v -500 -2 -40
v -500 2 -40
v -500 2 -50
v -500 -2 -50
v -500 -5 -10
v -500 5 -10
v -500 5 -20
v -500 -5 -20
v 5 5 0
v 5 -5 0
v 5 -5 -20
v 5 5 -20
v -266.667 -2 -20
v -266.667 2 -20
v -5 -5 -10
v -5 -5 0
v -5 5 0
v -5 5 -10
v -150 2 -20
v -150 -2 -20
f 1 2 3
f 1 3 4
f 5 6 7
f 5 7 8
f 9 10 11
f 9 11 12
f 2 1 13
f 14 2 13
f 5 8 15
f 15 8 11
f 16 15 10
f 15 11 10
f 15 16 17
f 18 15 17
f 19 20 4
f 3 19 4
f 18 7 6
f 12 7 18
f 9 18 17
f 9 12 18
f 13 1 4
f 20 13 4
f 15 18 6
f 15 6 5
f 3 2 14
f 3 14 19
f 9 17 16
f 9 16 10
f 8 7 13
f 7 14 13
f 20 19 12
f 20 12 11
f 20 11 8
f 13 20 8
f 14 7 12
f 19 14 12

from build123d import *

# Parameters (mm, degrees)
F0_W     = 10
F0_H     = 10
F1_DEPTH = 20
F2_W     = 10
F2_H     = 10
F3_DEPTH = 495
F4_W     = 350
F4_H     = 4
F5_DEPTH = 30
F7_DEPTH = 7.001
F9_DEPTH = 7.001


with BuildPart() as f1:
    # F0 (on Top) → F1 (new body)
    with BuildSketch(Plane.XY):
        Rectangle(F0_W, F0_H)
    extrude(amount=-F1_DEPTH)

    # F2 (on face) → F3 (join)
    with BuildSketch(Plane(origin=(-5, 0, 0), x_dir=(0, -1, 0), z_dir=(-1, 0, 0))):
        with Locations((0, -15)):
            Rectangle(F2_W, F2_H)
    extrude(amount=F3_DEPTH)

    # F4 (on face) → F5 (join)
    with BuildSketch(Plane(origin=(0, 0, -20), x_dir=(1, 0, 0), z_dir=(0, 0, -1))):
        with Locations((-325, 0)):
            Rectangle(F4_W, F4_H)
    extrude(amount=F5_DEPTH)

    # F6 (on face) → F7 (cut, through all)
    with BuildSketch(Plane.XZ.offset(2)):
        Polygon((-150, -50), (-150, -20), (-500, -50), align=None)
    extrude(amount=-F7_DEPTH, mode=Mode.SUBTRACT)

    # F8 (on face) → F9 (cut, through all)
    with BuildSketch(Plane.XZ.offset(2)):
        Polygon((-500, -20), (-500, -40), (-266.666667, -20), align=None)
    extrude(amount=-F9_DEPTH, mode=Mode.SUBTRACT)


solid = f1.part
